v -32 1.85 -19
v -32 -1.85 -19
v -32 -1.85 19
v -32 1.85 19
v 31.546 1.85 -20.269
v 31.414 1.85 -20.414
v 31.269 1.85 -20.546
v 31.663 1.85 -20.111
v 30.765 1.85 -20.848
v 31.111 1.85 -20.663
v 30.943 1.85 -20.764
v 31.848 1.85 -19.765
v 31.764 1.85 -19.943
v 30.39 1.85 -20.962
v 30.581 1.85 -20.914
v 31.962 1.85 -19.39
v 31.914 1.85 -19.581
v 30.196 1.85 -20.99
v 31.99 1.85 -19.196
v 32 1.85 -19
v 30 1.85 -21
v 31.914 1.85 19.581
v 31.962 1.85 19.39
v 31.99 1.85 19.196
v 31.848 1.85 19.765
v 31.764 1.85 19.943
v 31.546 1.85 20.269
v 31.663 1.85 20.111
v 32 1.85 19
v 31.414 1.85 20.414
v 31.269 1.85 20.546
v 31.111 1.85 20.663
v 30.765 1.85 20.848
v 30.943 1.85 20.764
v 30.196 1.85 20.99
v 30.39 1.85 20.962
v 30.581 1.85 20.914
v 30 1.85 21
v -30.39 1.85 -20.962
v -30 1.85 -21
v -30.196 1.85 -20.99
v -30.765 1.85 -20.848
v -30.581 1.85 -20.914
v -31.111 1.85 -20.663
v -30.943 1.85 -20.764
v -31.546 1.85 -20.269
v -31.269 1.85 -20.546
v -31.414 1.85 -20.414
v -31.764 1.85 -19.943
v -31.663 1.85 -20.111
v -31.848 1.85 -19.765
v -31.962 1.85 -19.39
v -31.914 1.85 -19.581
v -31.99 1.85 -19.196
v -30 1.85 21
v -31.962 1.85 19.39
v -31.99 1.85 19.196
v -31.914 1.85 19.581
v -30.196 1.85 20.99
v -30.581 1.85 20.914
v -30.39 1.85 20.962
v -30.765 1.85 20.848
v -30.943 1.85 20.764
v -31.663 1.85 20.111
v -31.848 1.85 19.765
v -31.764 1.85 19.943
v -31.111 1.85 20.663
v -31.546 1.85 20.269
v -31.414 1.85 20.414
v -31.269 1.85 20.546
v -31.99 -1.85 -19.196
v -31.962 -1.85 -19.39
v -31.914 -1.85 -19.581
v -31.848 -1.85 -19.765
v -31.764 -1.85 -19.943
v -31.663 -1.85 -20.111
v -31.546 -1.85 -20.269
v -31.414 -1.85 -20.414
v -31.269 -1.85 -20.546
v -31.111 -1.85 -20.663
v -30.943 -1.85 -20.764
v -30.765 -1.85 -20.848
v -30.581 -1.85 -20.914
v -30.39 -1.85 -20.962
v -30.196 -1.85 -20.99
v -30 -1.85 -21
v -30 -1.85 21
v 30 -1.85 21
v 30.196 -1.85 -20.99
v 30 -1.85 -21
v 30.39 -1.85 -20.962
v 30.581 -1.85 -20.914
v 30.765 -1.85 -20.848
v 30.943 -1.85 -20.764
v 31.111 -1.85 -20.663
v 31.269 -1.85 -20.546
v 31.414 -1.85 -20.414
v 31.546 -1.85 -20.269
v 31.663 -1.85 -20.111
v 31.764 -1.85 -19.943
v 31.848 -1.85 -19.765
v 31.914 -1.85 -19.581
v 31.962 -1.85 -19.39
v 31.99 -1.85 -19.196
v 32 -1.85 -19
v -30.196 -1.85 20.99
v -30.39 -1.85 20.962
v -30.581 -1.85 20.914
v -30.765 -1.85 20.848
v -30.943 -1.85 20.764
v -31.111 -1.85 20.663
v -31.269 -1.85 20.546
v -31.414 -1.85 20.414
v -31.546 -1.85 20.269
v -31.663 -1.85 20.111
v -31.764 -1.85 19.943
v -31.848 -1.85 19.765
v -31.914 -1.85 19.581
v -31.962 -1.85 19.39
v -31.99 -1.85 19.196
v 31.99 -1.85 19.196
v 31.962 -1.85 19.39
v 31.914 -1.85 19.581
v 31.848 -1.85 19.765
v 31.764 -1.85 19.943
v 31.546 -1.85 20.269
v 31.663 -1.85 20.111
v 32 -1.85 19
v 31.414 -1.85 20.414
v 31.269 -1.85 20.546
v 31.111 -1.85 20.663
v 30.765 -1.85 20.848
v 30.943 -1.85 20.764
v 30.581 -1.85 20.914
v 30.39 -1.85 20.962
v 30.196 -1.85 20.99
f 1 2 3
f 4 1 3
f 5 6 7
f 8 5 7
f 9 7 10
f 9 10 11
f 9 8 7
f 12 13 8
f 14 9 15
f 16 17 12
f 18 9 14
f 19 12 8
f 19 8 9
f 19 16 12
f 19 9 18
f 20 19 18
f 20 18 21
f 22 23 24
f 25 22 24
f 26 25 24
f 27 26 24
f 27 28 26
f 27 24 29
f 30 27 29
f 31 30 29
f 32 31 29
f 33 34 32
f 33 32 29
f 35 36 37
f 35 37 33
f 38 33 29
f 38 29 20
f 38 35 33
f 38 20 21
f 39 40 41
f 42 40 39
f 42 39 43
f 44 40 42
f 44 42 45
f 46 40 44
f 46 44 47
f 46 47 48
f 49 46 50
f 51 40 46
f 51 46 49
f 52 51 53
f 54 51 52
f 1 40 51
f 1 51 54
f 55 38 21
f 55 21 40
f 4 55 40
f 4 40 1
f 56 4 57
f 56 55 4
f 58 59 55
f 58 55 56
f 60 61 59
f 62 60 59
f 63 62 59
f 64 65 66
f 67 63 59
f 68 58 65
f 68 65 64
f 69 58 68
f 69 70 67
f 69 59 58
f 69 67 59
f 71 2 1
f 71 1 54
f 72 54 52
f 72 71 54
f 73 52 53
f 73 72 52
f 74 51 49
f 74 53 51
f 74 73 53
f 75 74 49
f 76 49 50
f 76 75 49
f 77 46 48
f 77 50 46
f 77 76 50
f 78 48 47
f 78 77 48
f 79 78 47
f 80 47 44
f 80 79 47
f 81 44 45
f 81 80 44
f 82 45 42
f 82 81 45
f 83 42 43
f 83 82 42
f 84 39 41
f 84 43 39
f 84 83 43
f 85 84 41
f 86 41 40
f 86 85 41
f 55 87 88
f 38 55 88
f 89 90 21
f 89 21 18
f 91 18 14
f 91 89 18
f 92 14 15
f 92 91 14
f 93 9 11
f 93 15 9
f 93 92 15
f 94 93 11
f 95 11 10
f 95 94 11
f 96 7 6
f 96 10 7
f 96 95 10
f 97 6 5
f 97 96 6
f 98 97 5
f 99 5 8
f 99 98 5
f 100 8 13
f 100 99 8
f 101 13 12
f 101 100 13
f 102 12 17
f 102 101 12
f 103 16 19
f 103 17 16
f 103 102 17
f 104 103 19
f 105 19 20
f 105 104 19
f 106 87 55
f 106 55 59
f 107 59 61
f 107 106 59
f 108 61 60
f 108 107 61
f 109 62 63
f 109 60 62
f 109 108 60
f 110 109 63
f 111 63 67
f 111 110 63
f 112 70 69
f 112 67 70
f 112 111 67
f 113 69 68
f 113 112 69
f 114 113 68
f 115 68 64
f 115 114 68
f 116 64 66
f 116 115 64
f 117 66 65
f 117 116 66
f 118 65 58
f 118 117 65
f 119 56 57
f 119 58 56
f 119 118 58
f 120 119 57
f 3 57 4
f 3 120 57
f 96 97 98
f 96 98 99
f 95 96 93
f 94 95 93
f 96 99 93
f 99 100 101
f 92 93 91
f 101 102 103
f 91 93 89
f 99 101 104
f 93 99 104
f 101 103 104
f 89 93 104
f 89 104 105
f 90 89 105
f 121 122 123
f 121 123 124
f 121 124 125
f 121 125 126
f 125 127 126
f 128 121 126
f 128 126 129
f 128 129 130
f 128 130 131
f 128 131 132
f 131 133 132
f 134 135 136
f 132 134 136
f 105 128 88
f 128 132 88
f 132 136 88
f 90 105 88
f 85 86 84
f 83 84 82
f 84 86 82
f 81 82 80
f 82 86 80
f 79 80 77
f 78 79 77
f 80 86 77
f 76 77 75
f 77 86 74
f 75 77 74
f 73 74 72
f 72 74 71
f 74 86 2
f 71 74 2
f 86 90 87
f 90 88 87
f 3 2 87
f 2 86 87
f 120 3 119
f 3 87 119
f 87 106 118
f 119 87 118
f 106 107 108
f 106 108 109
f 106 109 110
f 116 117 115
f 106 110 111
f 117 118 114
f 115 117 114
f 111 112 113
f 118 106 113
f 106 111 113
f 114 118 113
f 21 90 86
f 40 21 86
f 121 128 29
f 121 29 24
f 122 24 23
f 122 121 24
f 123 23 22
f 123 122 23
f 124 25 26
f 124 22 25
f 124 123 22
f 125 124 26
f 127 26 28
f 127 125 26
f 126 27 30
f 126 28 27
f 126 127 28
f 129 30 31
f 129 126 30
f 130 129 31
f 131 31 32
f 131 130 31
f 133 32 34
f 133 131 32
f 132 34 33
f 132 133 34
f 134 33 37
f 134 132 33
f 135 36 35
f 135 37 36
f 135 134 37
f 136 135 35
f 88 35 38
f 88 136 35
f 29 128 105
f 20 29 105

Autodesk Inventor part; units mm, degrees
ref_plane "YZ Plane" through (0, 0, 0) normal (1, 0, 0) x (0, 1, 0)
ref_plane "XZ Plane" through (0, 0, 0) normal (0, 1, 0) x (-1, 0, 0)
ref_plane "XY Plane" through (0, 0, 0) normal (0, 0, 1) x (1, 0, 0)
sketch "Sketch1" plane through (0, 0, 0) normal (0, 1, 0) x (-1, 0, 0)
  line L0 (30, 21) -> (-30, 21)
  line L1 (-32, 19) -> (-32, -19)
  line L2 (-30, -21) -> (30, -21)
  line L3 (32, -19) -> (32, 19)
  line L4 (32, 21) -> (-32, -21) construction
  line L5 (-32, 21) -> (32, -21) construction
  arc A0 (30, -21) -> (32, -19) centre (30, -19) ccw
  arc A1 (32, 19) -> (30, 21) centre (30, 19) ccw
  arc A2 (-30, 21) -> (-32, 19) centre (-30, 19) ccw
  arc A3 (-32, -19) -> (-30, -21) centre (-30, -19) ccw
  point P0 (0, 0)
  dimension "d0" = 64
  dimension "d1" = 42
  dimension "d2" = 2
extrude "Extrusion1" add sketch "Sketch1" along normal mid plane 3.7
equation "\"d0\" = CardLength"
equation "\"d1\" = CardWidth"
equation "\"d3\" = CardHeight"
equation "\"CardWidth\" = 42"
equation "\"CardLength\" = 64"
equation "\"CardHeight\" = 3.7"
properties part number "FactionCards_All" material "Paper"
